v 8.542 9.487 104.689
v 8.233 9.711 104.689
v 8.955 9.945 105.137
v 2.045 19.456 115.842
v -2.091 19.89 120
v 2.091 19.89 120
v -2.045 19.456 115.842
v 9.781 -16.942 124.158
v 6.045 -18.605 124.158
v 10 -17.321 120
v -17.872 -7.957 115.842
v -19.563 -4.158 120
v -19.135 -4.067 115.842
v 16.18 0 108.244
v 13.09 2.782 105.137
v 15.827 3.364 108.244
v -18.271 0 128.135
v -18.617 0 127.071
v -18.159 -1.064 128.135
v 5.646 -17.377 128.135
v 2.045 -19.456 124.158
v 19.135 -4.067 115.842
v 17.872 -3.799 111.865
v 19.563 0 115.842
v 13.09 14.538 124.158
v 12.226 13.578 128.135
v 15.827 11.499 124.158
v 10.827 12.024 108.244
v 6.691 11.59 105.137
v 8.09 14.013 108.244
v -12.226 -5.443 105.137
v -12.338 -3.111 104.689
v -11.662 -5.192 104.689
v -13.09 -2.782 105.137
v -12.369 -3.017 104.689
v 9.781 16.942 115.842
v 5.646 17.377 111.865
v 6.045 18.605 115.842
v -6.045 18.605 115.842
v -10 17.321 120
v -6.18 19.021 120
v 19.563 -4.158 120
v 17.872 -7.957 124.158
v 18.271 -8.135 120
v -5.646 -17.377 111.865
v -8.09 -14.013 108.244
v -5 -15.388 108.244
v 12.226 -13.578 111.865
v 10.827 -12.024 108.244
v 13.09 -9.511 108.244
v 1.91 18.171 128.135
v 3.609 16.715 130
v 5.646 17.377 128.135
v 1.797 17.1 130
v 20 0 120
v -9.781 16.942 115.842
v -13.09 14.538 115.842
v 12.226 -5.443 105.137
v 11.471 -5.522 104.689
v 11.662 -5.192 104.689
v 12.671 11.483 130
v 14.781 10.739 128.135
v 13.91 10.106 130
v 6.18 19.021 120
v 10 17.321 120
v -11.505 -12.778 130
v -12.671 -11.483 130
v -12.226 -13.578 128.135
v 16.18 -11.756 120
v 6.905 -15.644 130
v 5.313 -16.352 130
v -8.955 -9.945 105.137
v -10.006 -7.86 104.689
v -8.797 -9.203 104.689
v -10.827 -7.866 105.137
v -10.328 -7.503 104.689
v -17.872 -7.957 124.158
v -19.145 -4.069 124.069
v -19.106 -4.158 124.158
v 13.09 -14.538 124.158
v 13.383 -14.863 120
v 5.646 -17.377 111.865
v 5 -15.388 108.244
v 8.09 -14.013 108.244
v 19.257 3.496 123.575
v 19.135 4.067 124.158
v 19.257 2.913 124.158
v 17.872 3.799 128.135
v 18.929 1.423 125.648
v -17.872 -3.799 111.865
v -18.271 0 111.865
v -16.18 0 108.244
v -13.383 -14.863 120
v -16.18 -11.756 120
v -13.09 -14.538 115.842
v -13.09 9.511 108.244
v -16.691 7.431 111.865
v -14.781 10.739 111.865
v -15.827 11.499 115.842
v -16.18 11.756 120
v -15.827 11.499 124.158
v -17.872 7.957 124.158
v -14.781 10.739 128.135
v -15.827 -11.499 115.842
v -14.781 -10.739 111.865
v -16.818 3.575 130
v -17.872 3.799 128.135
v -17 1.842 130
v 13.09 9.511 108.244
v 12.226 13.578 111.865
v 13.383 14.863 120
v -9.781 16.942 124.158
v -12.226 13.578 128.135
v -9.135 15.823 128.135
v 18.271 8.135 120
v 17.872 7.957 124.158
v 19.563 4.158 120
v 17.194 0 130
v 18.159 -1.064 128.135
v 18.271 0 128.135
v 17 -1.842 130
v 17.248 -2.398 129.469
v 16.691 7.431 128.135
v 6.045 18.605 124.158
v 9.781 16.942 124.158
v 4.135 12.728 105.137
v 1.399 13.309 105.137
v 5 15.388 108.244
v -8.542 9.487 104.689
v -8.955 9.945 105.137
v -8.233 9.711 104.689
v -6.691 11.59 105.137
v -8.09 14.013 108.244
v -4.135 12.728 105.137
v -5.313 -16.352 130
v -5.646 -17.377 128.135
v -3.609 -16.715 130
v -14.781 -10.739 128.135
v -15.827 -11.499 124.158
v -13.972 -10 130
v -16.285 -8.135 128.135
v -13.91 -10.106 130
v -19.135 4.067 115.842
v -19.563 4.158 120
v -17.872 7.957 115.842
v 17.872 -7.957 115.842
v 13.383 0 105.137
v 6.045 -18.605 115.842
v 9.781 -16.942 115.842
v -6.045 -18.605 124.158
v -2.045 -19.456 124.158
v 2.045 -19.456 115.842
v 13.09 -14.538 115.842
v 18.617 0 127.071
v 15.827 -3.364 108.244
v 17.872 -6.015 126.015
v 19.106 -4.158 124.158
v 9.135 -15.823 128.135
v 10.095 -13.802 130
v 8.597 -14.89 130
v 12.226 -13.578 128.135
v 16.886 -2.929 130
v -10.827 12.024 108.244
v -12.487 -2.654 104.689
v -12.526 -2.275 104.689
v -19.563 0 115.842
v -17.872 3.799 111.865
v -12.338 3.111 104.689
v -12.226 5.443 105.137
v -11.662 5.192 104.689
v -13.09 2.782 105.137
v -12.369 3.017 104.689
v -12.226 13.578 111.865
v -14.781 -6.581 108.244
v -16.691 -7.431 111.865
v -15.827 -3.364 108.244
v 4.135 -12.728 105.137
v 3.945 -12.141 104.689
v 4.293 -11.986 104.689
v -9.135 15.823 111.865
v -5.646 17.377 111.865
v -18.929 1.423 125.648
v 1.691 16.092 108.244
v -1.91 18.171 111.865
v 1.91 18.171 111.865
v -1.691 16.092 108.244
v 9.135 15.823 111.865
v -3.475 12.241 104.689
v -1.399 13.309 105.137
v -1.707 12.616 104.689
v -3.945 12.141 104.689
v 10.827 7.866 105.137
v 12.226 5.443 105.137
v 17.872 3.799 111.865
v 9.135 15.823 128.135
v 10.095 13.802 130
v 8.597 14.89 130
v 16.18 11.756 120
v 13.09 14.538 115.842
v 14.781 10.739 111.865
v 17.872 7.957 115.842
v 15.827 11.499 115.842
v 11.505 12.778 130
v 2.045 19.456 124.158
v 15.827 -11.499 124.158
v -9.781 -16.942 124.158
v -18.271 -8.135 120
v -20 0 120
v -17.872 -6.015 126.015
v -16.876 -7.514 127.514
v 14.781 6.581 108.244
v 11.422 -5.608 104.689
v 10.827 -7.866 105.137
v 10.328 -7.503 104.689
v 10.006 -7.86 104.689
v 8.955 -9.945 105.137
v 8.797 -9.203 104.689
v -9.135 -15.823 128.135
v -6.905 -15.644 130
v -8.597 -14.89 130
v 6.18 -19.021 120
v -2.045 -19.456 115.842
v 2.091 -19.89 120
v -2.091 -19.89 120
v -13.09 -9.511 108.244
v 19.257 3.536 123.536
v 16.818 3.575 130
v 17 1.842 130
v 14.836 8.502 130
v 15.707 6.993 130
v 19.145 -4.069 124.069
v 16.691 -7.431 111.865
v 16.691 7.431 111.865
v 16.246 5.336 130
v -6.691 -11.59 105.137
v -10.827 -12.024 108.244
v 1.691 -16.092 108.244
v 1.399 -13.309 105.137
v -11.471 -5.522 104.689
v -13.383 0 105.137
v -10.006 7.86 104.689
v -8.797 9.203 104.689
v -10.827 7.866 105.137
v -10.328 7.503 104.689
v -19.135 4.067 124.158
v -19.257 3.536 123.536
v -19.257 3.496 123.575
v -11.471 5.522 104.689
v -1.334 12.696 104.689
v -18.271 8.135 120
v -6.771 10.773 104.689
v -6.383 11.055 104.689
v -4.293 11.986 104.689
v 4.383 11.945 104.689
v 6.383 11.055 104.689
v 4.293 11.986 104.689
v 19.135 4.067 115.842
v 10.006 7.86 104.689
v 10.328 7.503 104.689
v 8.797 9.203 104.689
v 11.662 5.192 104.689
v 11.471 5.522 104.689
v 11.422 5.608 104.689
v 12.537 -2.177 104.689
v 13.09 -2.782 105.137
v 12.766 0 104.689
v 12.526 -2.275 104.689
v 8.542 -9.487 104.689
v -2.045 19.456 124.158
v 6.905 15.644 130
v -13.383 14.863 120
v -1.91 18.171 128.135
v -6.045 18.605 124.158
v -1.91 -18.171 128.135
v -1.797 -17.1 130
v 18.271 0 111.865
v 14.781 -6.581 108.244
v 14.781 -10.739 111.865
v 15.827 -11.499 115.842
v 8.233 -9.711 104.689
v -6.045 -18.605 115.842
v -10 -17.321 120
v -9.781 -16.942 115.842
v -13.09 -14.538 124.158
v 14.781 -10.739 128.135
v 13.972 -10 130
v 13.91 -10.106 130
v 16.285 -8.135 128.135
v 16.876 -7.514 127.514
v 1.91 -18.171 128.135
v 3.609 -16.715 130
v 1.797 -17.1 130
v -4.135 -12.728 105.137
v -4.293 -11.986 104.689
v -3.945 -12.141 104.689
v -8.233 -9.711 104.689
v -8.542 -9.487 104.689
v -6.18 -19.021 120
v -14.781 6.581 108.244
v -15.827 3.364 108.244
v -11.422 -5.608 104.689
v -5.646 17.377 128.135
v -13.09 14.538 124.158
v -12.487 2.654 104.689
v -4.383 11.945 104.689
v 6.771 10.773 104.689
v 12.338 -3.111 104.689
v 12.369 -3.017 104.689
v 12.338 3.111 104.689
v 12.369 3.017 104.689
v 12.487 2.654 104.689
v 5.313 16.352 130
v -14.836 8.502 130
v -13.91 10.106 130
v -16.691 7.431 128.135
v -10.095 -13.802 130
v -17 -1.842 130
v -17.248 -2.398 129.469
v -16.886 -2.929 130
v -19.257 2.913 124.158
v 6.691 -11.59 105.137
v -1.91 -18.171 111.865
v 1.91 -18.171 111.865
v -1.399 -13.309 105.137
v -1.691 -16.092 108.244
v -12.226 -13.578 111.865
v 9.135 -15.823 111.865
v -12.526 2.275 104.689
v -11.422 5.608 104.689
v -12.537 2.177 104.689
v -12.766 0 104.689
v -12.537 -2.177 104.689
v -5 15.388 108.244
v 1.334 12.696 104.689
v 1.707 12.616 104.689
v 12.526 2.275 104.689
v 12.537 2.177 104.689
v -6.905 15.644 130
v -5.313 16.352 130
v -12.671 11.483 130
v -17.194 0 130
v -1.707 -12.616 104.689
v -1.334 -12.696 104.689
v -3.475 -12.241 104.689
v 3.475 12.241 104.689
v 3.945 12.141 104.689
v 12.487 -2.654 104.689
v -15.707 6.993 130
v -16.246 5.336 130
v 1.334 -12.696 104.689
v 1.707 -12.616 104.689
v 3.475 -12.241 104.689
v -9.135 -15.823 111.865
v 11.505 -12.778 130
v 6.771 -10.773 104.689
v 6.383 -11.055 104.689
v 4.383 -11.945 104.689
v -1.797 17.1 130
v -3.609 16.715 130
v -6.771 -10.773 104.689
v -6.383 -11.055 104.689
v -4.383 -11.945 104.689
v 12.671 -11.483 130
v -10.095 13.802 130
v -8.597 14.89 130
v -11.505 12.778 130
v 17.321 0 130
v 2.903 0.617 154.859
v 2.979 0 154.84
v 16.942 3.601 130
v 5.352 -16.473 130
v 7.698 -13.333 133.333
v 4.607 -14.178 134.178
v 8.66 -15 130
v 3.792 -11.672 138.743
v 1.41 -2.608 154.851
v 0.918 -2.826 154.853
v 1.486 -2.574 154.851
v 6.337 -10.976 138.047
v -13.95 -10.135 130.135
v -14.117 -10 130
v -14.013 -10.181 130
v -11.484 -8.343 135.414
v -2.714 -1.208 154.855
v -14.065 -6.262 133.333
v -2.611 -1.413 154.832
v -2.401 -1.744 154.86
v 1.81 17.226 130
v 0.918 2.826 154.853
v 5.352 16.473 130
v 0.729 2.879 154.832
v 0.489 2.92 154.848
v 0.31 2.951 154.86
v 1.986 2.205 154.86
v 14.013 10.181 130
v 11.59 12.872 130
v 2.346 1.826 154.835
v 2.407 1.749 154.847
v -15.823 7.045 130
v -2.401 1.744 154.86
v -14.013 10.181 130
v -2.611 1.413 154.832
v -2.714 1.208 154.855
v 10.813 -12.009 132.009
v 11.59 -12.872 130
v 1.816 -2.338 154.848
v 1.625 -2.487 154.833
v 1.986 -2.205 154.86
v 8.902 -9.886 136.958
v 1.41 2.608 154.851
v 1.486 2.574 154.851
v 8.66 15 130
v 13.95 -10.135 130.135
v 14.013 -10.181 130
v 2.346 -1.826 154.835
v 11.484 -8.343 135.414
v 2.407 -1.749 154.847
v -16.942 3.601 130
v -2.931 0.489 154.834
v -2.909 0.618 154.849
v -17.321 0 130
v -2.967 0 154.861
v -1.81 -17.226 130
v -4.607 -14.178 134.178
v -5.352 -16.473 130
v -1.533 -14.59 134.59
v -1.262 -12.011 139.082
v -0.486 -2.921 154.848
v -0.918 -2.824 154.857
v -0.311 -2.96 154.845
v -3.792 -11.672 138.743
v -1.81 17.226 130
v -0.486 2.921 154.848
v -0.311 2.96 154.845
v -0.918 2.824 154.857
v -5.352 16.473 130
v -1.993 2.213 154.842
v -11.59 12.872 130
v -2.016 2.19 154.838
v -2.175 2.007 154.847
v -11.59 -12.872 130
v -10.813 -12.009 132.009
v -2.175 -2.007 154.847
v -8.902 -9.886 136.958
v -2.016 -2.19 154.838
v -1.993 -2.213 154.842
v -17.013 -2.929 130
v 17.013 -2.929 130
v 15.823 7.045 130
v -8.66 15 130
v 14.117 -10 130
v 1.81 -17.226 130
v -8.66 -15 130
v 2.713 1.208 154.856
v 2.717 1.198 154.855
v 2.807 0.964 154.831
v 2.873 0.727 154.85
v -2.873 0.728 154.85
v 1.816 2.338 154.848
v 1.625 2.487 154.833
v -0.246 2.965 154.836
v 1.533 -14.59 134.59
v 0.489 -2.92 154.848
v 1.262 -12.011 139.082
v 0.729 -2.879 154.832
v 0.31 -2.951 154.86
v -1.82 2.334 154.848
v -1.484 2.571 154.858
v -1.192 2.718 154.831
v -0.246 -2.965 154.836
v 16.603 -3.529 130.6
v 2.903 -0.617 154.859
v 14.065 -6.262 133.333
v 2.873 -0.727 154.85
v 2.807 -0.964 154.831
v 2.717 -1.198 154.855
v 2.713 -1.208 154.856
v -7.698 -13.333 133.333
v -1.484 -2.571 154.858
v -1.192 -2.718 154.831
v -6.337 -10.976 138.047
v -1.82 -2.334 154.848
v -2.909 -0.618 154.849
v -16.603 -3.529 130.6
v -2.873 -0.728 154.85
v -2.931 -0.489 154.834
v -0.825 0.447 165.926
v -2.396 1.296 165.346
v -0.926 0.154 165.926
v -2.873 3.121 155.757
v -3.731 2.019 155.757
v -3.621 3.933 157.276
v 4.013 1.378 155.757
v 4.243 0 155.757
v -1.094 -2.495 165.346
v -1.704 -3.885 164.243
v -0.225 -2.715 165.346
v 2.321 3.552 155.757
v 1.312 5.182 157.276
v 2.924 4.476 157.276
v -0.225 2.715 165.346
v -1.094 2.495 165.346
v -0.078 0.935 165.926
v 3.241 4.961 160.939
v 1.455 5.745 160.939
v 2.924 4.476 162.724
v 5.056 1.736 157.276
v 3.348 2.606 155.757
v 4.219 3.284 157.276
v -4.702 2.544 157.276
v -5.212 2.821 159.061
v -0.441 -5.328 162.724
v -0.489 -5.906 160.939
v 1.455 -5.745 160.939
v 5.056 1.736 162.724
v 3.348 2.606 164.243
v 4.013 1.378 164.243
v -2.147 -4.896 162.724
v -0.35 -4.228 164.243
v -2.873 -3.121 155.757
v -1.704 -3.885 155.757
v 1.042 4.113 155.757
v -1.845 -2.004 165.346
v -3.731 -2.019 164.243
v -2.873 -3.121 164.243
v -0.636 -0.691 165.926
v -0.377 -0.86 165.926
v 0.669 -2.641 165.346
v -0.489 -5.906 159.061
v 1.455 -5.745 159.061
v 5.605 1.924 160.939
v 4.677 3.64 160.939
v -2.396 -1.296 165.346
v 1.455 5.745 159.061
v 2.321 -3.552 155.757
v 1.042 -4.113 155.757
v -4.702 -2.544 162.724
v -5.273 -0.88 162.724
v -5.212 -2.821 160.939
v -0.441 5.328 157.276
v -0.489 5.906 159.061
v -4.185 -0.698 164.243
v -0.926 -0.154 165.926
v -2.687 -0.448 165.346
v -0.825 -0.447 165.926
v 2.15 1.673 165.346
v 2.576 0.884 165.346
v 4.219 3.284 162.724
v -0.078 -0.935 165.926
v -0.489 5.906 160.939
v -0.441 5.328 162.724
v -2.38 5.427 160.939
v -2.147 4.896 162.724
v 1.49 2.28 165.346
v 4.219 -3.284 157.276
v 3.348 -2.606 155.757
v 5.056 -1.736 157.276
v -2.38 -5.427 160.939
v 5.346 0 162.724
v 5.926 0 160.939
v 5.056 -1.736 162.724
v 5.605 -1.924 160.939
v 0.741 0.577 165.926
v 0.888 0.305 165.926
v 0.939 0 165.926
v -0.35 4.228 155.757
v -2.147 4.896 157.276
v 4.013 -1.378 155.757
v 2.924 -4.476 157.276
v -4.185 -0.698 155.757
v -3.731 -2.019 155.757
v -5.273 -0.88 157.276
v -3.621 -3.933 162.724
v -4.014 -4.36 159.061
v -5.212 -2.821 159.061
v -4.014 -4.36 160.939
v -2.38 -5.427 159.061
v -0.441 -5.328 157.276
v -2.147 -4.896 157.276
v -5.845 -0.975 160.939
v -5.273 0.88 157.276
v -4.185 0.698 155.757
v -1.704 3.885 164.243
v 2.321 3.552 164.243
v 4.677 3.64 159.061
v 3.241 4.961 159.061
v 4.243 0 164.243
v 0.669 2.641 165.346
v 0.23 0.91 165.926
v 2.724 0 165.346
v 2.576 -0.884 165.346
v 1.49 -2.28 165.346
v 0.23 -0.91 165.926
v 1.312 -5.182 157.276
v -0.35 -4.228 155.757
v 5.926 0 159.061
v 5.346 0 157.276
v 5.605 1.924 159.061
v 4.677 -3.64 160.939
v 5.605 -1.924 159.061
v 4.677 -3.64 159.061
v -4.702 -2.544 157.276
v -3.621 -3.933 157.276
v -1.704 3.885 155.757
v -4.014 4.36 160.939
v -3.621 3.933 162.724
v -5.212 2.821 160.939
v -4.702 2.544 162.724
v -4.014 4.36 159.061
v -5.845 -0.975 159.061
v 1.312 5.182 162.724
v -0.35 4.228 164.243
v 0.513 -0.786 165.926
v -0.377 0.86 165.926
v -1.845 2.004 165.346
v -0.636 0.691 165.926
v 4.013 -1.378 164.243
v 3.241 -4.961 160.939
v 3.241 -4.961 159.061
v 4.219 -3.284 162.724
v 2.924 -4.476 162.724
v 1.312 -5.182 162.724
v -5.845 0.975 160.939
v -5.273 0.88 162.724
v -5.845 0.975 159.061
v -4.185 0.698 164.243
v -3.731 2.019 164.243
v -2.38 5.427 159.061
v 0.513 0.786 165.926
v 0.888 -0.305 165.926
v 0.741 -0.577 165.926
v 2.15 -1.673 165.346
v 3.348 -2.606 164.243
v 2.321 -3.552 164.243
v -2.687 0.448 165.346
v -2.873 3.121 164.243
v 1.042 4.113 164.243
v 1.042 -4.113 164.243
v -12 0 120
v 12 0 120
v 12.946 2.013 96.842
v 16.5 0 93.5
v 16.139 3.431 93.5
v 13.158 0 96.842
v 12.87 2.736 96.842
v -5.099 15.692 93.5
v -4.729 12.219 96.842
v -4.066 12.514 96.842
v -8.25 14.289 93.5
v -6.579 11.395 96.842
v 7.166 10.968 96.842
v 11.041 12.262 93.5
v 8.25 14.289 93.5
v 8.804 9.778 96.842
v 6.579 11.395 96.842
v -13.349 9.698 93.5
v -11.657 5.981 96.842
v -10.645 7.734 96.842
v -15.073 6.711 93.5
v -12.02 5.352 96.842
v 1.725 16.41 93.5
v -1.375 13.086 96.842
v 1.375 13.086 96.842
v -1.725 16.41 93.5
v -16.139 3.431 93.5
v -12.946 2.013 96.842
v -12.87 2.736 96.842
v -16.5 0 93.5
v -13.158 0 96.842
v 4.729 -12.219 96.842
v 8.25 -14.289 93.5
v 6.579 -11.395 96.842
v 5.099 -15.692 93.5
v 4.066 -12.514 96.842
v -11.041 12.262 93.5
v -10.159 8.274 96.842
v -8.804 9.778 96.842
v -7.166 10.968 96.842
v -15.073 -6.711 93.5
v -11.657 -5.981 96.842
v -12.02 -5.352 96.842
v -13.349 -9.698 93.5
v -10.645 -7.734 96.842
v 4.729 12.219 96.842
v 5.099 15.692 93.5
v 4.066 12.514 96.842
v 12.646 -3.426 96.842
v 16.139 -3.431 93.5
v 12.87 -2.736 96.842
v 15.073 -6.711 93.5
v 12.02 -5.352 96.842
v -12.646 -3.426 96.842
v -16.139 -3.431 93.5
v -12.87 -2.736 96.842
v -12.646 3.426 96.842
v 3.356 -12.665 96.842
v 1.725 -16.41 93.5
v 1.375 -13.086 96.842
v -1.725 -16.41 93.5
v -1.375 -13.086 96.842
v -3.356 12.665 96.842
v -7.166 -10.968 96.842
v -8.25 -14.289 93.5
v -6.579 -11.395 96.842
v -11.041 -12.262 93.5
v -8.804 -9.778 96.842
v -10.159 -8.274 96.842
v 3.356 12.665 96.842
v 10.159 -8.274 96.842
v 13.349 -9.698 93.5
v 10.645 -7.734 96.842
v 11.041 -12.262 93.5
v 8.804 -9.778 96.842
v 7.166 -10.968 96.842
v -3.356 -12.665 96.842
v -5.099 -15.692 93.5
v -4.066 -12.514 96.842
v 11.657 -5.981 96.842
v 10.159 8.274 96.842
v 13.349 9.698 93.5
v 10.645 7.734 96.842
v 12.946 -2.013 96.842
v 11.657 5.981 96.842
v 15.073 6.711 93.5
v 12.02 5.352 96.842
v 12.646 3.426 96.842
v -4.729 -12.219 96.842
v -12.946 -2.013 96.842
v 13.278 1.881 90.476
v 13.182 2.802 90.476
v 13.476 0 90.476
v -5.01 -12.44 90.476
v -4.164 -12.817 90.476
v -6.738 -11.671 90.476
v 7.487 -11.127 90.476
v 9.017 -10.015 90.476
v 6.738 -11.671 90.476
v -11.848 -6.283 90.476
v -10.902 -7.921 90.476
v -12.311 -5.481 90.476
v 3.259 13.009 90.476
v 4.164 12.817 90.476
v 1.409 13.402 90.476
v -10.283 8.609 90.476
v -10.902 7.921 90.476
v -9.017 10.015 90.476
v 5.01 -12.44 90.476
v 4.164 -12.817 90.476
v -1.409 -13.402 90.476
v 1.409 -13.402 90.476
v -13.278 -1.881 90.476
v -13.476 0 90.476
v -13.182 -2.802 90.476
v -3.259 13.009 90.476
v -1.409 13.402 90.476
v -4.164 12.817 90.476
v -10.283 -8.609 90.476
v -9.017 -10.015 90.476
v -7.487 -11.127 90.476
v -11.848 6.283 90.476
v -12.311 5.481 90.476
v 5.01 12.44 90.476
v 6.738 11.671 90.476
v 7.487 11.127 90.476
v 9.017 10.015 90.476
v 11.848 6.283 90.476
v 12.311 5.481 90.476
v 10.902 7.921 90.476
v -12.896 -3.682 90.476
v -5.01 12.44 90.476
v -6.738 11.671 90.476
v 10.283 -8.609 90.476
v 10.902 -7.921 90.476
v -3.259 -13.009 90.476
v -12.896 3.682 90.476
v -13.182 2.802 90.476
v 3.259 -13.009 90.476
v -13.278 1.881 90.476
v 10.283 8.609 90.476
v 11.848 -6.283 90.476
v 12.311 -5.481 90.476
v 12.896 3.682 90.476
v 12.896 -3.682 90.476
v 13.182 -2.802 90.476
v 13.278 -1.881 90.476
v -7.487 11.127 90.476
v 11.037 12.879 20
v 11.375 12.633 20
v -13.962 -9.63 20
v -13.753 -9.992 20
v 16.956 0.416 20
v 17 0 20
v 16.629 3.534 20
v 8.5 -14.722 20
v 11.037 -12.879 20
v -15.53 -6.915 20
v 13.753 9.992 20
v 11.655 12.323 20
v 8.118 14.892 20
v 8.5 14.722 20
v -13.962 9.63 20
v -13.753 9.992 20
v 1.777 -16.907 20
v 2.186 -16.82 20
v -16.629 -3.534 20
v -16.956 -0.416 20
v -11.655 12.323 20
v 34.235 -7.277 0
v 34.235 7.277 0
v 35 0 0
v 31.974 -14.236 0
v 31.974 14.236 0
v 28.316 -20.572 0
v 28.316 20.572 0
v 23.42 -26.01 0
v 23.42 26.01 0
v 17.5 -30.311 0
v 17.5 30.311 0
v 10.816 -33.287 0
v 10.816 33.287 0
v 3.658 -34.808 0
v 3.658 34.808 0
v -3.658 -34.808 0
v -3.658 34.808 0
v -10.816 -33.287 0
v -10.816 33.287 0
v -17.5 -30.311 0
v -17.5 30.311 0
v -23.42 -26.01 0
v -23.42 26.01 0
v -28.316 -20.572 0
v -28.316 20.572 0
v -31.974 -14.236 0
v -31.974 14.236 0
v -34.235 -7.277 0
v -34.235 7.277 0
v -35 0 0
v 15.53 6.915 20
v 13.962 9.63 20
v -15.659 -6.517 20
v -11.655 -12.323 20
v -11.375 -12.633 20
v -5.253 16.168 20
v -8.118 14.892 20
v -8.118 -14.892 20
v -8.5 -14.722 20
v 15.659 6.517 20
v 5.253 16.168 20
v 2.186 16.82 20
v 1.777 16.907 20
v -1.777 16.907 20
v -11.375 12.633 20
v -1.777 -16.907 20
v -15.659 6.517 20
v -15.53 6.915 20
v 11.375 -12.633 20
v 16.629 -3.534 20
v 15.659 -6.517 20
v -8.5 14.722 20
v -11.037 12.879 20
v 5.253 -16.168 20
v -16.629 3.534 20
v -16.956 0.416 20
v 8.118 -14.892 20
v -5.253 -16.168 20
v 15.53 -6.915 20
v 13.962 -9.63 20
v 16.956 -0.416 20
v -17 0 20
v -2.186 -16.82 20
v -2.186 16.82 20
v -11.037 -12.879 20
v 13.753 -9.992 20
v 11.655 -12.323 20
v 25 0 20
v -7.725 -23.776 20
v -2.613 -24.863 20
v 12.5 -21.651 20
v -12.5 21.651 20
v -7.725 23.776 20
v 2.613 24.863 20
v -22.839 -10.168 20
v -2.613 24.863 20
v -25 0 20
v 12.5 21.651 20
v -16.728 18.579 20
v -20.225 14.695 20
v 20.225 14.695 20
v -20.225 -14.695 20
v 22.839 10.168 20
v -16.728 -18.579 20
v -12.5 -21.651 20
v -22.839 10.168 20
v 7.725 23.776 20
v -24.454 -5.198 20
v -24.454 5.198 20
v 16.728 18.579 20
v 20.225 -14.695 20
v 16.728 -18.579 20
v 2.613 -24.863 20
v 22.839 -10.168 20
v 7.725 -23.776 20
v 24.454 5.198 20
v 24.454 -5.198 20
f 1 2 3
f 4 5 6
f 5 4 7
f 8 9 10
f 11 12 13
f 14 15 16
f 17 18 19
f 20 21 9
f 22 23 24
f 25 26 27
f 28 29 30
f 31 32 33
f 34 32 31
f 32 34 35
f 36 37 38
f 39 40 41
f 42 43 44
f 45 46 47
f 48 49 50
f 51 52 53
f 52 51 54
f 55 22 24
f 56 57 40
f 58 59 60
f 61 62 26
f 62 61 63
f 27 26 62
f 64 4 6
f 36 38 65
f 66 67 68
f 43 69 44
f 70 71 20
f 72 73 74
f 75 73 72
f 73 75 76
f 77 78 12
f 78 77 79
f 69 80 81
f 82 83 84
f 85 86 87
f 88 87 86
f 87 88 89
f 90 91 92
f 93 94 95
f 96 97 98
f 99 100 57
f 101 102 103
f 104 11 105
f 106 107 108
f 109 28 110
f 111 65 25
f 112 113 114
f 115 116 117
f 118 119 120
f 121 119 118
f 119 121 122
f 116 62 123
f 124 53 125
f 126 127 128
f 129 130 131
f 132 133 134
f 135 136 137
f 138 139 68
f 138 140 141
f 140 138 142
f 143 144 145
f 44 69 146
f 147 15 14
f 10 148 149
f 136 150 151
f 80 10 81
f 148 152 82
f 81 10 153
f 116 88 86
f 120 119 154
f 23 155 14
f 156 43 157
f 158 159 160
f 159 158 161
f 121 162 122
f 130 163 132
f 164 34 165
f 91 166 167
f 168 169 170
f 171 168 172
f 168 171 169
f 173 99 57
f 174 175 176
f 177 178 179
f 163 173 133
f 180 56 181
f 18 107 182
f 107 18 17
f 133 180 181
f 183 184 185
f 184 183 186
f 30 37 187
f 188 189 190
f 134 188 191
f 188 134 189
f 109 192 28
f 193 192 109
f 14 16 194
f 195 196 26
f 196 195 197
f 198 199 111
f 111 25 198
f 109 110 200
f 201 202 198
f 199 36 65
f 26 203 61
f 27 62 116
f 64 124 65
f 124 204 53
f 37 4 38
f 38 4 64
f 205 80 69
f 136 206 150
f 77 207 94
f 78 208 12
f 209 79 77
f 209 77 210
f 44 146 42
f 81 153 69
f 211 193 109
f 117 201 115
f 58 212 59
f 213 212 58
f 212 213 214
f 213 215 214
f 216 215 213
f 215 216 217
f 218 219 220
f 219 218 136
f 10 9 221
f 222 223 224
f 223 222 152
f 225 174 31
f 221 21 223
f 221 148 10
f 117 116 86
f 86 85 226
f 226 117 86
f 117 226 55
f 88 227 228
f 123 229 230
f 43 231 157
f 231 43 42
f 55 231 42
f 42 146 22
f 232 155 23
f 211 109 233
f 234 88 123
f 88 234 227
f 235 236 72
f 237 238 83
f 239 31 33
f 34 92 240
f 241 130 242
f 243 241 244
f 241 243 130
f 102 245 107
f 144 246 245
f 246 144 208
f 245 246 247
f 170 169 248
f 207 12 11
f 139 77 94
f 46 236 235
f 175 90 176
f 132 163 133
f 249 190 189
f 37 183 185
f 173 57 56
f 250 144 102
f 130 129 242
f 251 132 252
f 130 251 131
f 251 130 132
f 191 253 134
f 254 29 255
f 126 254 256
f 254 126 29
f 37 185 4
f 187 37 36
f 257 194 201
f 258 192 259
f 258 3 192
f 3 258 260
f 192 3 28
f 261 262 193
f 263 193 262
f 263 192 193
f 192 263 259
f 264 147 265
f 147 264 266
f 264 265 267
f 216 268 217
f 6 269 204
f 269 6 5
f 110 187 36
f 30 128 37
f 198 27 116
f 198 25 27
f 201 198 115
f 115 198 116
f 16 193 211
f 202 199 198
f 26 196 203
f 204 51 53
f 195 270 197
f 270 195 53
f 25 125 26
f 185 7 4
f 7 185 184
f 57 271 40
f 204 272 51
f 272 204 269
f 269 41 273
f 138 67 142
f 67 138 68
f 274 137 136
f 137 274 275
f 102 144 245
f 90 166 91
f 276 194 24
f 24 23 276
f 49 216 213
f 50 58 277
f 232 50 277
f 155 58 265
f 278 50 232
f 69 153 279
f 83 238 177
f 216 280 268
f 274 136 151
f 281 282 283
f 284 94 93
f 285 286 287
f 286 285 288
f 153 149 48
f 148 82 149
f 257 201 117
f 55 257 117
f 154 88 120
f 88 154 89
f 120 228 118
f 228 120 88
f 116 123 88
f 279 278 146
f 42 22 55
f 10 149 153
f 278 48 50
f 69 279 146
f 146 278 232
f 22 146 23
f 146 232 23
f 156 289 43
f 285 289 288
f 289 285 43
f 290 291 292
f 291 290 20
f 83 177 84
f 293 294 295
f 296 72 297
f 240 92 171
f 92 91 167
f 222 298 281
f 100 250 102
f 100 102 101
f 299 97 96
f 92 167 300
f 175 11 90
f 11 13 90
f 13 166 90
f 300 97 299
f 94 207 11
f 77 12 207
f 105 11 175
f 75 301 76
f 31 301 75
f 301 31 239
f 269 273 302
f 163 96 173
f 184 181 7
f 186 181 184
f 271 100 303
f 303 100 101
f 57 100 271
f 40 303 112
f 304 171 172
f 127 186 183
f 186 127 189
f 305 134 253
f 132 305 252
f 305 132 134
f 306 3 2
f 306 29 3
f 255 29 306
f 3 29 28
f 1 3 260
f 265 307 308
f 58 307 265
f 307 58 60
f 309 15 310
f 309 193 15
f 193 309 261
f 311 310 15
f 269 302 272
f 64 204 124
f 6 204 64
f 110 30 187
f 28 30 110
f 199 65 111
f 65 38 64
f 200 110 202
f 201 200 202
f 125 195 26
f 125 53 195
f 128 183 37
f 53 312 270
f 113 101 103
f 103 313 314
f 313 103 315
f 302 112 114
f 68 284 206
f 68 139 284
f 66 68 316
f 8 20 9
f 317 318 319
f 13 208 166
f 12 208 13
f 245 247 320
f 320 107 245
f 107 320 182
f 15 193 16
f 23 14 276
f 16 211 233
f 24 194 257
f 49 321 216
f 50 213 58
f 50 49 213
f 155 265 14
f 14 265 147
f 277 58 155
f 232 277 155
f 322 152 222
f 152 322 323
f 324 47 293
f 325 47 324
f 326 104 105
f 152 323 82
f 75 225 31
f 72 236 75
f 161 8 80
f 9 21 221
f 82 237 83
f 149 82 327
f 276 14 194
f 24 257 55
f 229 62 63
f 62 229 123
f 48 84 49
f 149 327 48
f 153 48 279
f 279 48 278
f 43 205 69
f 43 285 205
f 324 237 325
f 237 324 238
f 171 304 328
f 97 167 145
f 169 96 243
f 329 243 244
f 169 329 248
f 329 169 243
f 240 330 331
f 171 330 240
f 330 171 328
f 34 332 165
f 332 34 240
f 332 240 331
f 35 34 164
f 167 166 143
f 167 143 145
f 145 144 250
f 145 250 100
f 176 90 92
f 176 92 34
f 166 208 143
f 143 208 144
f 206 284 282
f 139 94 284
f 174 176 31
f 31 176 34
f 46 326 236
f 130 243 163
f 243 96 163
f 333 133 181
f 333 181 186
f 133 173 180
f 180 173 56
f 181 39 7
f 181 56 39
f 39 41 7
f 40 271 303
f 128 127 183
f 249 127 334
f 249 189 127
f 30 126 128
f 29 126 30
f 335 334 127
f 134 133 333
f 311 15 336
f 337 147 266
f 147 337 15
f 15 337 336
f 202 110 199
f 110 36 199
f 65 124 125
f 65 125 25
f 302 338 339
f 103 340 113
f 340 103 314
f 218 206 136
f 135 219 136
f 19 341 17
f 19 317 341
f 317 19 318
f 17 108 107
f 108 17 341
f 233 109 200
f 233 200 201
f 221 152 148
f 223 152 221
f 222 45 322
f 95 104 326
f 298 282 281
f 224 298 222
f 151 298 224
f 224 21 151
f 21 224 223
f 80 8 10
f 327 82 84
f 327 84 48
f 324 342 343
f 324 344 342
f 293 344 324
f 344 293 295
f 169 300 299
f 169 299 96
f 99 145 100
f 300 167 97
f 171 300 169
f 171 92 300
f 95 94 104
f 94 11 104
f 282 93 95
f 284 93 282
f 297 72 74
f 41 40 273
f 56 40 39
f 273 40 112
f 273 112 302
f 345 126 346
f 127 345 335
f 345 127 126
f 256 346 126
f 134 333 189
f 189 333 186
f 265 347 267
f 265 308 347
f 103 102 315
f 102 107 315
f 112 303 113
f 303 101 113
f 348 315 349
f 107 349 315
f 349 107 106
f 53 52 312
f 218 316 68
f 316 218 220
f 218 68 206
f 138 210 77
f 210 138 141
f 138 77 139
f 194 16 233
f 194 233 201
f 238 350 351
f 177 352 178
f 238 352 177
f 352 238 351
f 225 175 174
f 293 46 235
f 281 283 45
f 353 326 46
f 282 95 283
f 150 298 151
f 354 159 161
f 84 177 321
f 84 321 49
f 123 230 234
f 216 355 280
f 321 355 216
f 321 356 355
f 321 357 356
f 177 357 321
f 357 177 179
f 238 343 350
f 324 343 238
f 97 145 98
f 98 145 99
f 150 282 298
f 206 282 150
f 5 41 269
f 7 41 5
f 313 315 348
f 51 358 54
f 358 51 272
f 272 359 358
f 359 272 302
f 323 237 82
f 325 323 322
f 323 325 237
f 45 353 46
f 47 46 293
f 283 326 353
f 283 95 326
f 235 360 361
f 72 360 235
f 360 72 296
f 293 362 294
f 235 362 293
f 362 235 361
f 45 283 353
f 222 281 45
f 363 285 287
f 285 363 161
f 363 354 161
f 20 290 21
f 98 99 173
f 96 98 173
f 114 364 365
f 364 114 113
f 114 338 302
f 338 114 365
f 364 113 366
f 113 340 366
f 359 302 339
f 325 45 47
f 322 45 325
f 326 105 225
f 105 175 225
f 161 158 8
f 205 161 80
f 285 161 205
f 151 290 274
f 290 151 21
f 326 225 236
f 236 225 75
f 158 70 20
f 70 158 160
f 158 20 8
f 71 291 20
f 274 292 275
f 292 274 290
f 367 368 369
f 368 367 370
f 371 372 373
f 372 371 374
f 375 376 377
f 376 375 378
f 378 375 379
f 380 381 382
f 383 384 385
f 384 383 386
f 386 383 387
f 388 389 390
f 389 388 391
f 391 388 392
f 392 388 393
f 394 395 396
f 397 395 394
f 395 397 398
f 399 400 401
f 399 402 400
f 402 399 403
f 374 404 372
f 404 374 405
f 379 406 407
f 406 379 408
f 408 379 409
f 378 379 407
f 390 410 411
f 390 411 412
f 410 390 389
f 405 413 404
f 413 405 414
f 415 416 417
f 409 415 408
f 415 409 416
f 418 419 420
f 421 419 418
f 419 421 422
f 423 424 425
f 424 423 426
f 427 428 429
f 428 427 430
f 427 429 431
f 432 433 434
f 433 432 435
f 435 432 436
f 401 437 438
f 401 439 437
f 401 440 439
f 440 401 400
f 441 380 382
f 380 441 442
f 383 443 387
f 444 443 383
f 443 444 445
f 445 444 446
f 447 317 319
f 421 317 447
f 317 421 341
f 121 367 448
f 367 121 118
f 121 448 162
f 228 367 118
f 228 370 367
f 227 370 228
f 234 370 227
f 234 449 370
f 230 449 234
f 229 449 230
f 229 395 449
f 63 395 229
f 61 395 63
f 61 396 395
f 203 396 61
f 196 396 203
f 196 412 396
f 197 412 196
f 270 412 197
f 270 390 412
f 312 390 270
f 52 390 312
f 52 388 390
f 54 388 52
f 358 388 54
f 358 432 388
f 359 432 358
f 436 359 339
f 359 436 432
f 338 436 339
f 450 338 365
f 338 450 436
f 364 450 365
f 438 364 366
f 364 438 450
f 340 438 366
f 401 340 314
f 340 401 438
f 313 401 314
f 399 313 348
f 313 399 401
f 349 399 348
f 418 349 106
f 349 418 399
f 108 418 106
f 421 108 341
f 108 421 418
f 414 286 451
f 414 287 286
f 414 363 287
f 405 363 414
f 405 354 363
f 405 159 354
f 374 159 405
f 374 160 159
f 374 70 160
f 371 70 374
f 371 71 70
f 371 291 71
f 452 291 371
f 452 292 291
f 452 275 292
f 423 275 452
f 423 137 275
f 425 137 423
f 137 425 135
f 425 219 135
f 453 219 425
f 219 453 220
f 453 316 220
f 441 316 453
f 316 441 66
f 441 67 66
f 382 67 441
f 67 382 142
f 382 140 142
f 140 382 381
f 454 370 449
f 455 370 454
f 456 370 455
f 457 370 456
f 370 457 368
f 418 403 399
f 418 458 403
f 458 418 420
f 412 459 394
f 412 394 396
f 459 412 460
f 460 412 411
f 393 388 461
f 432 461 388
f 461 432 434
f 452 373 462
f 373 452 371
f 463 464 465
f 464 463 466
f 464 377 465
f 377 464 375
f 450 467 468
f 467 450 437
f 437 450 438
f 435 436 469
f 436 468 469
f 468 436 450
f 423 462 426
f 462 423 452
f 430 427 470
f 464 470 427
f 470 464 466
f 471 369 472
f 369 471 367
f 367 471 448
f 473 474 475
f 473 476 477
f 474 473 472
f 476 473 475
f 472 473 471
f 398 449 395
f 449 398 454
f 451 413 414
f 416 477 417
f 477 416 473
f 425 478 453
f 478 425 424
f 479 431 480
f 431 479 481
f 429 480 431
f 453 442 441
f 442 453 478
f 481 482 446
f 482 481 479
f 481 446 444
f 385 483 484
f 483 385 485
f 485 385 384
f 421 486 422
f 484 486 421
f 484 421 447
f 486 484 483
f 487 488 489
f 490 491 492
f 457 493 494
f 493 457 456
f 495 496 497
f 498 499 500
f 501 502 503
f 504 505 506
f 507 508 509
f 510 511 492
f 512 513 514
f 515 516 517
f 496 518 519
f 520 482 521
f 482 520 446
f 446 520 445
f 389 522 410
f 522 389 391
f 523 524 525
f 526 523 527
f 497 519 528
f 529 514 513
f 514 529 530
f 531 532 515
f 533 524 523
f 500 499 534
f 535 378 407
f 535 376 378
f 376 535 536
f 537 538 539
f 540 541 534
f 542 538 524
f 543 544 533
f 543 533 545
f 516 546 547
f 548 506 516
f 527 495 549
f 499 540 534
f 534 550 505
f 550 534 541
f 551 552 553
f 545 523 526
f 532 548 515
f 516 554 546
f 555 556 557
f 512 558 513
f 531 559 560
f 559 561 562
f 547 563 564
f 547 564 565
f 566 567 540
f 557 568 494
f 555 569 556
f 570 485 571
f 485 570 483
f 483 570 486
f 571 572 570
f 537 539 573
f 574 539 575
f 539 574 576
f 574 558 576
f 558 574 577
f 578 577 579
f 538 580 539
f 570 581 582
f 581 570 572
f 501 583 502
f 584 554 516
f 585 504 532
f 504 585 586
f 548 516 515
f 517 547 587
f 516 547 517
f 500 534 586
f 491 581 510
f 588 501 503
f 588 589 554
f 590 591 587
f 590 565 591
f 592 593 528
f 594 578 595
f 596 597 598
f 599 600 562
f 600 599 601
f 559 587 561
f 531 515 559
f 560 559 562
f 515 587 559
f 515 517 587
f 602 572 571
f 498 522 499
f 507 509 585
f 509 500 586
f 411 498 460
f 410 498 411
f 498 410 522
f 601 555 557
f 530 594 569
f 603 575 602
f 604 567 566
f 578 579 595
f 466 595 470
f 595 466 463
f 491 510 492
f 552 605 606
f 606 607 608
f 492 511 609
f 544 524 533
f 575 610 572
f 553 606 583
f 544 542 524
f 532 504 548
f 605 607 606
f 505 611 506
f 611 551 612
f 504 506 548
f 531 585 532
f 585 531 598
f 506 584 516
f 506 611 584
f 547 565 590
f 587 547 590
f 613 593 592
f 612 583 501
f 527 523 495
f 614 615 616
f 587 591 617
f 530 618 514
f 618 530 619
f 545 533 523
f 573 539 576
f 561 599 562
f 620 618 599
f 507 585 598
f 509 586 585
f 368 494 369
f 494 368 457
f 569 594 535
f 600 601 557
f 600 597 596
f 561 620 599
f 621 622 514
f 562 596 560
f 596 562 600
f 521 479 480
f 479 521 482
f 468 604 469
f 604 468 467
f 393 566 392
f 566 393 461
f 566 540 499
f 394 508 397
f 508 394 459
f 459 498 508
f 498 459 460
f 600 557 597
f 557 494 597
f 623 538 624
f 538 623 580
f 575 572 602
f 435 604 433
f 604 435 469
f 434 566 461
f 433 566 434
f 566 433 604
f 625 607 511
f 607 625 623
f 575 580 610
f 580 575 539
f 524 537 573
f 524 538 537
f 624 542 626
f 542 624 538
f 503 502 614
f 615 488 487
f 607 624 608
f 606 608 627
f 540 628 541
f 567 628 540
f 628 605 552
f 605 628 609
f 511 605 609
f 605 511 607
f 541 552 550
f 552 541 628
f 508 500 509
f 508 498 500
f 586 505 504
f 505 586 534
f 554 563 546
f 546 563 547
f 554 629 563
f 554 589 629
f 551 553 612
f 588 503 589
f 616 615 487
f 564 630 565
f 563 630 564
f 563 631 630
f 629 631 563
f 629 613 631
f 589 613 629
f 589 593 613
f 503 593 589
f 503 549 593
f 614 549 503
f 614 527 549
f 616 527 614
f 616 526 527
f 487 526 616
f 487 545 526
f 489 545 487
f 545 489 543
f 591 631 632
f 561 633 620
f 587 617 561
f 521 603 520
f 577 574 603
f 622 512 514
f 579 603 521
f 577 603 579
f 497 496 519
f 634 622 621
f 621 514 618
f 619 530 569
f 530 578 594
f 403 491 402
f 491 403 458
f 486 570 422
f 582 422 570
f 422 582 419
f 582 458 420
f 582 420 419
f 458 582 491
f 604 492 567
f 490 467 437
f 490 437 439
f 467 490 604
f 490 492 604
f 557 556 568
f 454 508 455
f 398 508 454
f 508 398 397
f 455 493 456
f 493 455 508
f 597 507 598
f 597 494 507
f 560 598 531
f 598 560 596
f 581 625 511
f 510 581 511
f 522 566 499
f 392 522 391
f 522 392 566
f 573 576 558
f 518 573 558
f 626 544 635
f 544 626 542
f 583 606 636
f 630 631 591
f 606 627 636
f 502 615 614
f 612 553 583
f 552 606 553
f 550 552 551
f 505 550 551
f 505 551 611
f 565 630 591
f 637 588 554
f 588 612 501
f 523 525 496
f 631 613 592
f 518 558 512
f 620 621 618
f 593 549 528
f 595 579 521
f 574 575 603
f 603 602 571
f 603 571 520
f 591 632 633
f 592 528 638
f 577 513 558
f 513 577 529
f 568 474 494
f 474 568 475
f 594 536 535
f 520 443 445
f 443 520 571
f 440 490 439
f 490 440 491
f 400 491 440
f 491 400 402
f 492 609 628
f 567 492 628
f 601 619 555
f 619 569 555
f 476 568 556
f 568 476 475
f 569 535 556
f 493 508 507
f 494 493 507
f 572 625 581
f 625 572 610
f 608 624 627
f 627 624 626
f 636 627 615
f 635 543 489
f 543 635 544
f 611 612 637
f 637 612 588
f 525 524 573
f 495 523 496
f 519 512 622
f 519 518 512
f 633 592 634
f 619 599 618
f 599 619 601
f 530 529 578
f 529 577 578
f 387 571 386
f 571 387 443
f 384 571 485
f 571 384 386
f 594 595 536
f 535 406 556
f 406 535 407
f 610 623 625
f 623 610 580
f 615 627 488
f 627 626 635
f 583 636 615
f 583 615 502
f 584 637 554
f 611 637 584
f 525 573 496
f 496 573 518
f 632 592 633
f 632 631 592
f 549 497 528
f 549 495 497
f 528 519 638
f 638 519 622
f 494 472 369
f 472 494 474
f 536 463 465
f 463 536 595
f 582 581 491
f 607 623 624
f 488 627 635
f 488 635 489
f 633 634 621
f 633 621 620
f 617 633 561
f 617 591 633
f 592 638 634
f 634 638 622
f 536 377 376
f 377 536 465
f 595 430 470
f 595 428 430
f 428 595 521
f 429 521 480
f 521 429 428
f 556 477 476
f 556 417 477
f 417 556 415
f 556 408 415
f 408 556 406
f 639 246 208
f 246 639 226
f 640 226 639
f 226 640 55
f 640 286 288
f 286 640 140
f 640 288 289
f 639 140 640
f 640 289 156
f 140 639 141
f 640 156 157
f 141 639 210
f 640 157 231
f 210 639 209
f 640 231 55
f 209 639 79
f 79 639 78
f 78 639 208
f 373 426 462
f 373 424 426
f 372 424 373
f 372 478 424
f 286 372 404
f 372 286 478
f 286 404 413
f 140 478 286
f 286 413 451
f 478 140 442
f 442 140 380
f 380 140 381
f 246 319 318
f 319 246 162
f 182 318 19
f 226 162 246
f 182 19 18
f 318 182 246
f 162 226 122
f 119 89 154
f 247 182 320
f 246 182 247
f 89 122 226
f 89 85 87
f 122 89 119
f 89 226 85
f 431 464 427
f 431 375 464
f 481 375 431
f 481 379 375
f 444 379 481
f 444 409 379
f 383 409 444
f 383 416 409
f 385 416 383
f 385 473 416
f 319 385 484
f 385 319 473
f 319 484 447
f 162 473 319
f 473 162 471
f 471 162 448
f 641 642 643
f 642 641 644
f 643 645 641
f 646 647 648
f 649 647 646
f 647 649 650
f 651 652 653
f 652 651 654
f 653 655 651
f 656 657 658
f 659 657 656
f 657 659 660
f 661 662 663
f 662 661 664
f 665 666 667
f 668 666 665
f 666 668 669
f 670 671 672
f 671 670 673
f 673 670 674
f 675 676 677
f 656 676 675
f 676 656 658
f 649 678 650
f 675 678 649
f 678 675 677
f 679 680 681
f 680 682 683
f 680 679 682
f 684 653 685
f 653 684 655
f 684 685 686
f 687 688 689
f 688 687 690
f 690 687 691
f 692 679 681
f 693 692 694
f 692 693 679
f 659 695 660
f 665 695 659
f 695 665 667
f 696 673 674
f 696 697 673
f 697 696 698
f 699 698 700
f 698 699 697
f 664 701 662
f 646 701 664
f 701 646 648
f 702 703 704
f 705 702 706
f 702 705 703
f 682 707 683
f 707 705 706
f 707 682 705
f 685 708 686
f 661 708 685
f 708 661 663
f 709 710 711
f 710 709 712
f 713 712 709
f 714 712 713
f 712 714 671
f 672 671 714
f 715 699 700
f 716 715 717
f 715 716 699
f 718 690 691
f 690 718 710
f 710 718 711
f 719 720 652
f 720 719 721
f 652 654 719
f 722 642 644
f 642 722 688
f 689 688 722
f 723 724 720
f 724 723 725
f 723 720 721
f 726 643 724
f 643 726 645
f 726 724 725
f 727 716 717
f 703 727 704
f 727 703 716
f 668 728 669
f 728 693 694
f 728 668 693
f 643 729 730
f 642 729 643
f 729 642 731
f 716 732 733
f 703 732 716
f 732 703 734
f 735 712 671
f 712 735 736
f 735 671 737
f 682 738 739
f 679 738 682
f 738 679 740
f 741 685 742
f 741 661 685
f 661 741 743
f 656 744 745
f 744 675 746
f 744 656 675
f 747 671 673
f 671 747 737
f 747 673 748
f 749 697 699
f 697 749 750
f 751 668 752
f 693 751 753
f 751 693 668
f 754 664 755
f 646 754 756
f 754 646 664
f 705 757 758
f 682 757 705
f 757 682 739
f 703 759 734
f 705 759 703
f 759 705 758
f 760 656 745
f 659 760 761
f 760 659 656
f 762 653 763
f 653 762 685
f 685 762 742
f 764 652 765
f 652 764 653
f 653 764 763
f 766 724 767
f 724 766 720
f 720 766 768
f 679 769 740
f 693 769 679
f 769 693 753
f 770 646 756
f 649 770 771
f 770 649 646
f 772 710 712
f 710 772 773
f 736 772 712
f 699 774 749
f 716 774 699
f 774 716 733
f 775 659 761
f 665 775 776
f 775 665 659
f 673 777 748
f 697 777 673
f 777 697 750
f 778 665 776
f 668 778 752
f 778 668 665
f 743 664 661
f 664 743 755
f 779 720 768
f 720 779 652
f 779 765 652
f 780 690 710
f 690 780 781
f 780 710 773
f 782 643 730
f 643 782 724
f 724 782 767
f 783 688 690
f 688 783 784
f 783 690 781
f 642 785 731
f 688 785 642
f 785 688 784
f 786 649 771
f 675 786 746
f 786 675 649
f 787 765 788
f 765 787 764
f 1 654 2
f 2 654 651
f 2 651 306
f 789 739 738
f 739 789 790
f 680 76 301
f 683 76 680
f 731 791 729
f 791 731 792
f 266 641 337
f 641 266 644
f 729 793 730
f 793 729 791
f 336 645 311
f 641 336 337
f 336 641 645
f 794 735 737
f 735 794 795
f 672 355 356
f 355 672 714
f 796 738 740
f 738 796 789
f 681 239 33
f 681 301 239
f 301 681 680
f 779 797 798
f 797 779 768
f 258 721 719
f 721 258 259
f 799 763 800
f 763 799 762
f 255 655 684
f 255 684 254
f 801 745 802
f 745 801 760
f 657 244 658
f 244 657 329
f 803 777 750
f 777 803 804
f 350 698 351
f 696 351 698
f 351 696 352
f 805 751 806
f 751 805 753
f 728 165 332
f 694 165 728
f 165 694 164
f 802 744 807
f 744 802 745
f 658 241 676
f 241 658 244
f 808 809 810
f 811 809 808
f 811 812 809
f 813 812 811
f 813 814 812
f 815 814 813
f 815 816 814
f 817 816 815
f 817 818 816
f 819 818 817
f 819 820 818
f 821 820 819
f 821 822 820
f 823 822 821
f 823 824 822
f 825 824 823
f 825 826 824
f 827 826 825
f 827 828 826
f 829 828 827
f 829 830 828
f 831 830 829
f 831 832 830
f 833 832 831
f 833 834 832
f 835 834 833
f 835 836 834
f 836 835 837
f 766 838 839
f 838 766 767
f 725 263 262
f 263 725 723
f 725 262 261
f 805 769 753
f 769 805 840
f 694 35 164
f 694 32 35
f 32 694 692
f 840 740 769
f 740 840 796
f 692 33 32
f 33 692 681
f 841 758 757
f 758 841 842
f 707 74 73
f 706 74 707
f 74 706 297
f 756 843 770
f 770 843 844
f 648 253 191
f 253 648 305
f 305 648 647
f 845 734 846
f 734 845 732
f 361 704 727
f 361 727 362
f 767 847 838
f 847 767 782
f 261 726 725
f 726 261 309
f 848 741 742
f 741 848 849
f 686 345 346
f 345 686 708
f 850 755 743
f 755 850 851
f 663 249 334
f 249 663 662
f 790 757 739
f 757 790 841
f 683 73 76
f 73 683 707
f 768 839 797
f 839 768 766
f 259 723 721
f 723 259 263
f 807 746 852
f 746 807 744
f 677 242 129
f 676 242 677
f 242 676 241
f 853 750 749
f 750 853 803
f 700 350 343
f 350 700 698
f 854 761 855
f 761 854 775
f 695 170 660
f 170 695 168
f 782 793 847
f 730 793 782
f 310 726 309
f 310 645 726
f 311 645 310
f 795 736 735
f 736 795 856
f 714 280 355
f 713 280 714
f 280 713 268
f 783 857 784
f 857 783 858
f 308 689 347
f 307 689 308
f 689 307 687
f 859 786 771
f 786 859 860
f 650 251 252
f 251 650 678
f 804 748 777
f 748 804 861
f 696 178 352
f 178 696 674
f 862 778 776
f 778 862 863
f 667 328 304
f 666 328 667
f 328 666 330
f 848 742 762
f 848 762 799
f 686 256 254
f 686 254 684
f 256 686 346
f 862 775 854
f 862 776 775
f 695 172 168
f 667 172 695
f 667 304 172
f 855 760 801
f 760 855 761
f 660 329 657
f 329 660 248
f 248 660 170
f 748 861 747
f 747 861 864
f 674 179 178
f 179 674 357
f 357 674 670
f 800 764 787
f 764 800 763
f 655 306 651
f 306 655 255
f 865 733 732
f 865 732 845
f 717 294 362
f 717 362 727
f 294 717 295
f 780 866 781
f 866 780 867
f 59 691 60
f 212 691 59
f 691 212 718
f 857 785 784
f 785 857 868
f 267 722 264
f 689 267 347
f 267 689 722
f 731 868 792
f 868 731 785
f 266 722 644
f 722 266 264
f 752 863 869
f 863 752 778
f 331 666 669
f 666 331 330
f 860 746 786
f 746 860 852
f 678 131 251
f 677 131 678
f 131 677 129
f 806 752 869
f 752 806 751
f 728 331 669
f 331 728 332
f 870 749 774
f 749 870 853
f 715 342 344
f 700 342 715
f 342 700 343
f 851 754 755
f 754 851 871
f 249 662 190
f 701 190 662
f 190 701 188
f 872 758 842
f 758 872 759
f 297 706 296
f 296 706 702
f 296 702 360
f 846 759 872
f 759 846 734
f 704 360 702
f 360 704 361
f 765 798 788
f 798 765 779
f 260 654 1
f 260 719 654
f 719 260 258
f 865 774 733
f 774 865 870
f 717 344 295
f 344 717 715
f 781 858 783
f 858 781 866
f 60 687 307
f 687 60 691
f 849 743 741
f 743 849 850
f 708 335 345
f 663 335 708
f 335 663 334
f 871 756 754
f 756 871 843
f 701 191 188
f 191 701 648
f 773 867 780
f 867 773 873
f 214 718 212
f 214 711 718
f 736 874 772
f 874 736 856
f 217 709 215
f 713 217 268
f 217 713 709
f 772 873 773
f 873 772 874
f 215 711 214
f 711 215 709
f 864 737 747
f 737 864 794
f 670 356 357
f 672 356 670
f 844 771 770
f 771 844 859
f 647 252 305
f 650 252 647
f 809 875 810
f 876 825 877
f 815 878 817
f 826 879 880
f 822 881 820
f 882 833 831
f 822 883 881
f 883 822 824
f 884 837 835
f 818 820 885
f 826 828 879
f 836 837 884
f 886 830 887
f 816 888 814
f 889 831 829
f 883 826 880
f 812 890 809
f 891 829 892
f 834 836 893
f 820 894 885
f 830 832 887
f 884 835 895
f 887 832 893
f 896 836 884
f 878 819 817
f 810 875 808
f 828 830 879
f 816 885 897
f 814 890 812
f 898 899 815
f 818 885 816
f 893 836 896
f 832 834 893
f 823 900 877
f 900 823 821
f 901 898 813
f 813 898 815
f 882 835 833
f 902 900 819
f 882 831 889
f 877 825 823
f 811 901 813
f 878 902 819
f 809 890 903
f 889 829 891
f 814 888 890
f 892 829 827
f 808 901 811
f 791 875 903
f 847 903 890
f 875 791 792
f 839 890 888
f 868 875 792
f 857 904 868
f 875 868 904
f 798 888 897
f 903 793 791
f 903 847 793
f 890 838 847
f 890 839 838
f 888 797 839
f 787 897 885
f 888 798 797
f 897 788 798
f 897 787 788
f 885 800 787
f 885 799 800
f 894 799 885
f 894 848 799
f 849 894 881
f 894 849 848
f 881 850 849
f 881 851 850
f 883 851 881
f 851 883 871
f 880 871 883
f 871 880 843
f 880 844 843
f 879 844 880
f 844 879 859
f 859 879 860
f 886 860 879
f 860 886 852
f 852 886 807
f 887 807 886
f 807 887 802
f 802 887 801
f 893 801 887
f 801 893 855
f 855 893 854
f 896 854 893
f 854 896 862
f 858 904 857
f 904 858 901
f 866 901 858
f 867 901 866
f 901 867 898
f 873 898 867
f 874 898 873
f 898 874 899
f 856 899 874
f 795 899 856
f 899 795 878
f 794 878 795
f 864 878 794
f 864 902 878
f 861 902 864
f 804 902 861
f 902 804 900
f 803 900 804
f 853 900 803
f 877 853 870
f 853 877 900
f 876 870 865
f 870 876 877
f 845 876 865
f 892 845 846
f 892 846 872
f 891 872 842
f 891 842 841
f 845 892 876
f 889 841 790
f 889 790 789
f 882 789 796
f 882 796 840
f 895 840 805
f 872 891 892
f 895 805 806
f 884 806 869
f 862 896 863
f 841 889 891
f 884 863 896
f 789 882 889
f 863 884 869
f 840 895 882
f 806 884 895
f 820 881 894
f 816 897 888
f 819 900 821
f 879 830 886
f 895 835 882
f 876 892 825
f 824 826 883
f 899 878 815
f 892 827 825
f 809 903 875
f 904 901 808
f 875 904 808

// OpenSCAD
union() {
    //tepe
    translate([0,0,120])
difference() {
    union() {
    sphere(20);
    translate([0,0,20 *sin(30)])
    cylinder(30,20 * cos(30),0);
        
        //topak
        translate([0,0,30+20 *sin(30)])
           sphere(6);
        
    }
    //cut out slot
    rotate([45,0,0])
     translate([-20,0,0])
       cube([40,5,40]);
  
} 
//boyun
cylinder(120,18,12);

//govde
cylinder (20,35,25);

//Taban
translate ([0,0,90])
intersection() {
    cylinder(20,20,0);
    translate([0,0,7])
    mirror([0,0,1])
    cylinder(20,20,0);
}
}
